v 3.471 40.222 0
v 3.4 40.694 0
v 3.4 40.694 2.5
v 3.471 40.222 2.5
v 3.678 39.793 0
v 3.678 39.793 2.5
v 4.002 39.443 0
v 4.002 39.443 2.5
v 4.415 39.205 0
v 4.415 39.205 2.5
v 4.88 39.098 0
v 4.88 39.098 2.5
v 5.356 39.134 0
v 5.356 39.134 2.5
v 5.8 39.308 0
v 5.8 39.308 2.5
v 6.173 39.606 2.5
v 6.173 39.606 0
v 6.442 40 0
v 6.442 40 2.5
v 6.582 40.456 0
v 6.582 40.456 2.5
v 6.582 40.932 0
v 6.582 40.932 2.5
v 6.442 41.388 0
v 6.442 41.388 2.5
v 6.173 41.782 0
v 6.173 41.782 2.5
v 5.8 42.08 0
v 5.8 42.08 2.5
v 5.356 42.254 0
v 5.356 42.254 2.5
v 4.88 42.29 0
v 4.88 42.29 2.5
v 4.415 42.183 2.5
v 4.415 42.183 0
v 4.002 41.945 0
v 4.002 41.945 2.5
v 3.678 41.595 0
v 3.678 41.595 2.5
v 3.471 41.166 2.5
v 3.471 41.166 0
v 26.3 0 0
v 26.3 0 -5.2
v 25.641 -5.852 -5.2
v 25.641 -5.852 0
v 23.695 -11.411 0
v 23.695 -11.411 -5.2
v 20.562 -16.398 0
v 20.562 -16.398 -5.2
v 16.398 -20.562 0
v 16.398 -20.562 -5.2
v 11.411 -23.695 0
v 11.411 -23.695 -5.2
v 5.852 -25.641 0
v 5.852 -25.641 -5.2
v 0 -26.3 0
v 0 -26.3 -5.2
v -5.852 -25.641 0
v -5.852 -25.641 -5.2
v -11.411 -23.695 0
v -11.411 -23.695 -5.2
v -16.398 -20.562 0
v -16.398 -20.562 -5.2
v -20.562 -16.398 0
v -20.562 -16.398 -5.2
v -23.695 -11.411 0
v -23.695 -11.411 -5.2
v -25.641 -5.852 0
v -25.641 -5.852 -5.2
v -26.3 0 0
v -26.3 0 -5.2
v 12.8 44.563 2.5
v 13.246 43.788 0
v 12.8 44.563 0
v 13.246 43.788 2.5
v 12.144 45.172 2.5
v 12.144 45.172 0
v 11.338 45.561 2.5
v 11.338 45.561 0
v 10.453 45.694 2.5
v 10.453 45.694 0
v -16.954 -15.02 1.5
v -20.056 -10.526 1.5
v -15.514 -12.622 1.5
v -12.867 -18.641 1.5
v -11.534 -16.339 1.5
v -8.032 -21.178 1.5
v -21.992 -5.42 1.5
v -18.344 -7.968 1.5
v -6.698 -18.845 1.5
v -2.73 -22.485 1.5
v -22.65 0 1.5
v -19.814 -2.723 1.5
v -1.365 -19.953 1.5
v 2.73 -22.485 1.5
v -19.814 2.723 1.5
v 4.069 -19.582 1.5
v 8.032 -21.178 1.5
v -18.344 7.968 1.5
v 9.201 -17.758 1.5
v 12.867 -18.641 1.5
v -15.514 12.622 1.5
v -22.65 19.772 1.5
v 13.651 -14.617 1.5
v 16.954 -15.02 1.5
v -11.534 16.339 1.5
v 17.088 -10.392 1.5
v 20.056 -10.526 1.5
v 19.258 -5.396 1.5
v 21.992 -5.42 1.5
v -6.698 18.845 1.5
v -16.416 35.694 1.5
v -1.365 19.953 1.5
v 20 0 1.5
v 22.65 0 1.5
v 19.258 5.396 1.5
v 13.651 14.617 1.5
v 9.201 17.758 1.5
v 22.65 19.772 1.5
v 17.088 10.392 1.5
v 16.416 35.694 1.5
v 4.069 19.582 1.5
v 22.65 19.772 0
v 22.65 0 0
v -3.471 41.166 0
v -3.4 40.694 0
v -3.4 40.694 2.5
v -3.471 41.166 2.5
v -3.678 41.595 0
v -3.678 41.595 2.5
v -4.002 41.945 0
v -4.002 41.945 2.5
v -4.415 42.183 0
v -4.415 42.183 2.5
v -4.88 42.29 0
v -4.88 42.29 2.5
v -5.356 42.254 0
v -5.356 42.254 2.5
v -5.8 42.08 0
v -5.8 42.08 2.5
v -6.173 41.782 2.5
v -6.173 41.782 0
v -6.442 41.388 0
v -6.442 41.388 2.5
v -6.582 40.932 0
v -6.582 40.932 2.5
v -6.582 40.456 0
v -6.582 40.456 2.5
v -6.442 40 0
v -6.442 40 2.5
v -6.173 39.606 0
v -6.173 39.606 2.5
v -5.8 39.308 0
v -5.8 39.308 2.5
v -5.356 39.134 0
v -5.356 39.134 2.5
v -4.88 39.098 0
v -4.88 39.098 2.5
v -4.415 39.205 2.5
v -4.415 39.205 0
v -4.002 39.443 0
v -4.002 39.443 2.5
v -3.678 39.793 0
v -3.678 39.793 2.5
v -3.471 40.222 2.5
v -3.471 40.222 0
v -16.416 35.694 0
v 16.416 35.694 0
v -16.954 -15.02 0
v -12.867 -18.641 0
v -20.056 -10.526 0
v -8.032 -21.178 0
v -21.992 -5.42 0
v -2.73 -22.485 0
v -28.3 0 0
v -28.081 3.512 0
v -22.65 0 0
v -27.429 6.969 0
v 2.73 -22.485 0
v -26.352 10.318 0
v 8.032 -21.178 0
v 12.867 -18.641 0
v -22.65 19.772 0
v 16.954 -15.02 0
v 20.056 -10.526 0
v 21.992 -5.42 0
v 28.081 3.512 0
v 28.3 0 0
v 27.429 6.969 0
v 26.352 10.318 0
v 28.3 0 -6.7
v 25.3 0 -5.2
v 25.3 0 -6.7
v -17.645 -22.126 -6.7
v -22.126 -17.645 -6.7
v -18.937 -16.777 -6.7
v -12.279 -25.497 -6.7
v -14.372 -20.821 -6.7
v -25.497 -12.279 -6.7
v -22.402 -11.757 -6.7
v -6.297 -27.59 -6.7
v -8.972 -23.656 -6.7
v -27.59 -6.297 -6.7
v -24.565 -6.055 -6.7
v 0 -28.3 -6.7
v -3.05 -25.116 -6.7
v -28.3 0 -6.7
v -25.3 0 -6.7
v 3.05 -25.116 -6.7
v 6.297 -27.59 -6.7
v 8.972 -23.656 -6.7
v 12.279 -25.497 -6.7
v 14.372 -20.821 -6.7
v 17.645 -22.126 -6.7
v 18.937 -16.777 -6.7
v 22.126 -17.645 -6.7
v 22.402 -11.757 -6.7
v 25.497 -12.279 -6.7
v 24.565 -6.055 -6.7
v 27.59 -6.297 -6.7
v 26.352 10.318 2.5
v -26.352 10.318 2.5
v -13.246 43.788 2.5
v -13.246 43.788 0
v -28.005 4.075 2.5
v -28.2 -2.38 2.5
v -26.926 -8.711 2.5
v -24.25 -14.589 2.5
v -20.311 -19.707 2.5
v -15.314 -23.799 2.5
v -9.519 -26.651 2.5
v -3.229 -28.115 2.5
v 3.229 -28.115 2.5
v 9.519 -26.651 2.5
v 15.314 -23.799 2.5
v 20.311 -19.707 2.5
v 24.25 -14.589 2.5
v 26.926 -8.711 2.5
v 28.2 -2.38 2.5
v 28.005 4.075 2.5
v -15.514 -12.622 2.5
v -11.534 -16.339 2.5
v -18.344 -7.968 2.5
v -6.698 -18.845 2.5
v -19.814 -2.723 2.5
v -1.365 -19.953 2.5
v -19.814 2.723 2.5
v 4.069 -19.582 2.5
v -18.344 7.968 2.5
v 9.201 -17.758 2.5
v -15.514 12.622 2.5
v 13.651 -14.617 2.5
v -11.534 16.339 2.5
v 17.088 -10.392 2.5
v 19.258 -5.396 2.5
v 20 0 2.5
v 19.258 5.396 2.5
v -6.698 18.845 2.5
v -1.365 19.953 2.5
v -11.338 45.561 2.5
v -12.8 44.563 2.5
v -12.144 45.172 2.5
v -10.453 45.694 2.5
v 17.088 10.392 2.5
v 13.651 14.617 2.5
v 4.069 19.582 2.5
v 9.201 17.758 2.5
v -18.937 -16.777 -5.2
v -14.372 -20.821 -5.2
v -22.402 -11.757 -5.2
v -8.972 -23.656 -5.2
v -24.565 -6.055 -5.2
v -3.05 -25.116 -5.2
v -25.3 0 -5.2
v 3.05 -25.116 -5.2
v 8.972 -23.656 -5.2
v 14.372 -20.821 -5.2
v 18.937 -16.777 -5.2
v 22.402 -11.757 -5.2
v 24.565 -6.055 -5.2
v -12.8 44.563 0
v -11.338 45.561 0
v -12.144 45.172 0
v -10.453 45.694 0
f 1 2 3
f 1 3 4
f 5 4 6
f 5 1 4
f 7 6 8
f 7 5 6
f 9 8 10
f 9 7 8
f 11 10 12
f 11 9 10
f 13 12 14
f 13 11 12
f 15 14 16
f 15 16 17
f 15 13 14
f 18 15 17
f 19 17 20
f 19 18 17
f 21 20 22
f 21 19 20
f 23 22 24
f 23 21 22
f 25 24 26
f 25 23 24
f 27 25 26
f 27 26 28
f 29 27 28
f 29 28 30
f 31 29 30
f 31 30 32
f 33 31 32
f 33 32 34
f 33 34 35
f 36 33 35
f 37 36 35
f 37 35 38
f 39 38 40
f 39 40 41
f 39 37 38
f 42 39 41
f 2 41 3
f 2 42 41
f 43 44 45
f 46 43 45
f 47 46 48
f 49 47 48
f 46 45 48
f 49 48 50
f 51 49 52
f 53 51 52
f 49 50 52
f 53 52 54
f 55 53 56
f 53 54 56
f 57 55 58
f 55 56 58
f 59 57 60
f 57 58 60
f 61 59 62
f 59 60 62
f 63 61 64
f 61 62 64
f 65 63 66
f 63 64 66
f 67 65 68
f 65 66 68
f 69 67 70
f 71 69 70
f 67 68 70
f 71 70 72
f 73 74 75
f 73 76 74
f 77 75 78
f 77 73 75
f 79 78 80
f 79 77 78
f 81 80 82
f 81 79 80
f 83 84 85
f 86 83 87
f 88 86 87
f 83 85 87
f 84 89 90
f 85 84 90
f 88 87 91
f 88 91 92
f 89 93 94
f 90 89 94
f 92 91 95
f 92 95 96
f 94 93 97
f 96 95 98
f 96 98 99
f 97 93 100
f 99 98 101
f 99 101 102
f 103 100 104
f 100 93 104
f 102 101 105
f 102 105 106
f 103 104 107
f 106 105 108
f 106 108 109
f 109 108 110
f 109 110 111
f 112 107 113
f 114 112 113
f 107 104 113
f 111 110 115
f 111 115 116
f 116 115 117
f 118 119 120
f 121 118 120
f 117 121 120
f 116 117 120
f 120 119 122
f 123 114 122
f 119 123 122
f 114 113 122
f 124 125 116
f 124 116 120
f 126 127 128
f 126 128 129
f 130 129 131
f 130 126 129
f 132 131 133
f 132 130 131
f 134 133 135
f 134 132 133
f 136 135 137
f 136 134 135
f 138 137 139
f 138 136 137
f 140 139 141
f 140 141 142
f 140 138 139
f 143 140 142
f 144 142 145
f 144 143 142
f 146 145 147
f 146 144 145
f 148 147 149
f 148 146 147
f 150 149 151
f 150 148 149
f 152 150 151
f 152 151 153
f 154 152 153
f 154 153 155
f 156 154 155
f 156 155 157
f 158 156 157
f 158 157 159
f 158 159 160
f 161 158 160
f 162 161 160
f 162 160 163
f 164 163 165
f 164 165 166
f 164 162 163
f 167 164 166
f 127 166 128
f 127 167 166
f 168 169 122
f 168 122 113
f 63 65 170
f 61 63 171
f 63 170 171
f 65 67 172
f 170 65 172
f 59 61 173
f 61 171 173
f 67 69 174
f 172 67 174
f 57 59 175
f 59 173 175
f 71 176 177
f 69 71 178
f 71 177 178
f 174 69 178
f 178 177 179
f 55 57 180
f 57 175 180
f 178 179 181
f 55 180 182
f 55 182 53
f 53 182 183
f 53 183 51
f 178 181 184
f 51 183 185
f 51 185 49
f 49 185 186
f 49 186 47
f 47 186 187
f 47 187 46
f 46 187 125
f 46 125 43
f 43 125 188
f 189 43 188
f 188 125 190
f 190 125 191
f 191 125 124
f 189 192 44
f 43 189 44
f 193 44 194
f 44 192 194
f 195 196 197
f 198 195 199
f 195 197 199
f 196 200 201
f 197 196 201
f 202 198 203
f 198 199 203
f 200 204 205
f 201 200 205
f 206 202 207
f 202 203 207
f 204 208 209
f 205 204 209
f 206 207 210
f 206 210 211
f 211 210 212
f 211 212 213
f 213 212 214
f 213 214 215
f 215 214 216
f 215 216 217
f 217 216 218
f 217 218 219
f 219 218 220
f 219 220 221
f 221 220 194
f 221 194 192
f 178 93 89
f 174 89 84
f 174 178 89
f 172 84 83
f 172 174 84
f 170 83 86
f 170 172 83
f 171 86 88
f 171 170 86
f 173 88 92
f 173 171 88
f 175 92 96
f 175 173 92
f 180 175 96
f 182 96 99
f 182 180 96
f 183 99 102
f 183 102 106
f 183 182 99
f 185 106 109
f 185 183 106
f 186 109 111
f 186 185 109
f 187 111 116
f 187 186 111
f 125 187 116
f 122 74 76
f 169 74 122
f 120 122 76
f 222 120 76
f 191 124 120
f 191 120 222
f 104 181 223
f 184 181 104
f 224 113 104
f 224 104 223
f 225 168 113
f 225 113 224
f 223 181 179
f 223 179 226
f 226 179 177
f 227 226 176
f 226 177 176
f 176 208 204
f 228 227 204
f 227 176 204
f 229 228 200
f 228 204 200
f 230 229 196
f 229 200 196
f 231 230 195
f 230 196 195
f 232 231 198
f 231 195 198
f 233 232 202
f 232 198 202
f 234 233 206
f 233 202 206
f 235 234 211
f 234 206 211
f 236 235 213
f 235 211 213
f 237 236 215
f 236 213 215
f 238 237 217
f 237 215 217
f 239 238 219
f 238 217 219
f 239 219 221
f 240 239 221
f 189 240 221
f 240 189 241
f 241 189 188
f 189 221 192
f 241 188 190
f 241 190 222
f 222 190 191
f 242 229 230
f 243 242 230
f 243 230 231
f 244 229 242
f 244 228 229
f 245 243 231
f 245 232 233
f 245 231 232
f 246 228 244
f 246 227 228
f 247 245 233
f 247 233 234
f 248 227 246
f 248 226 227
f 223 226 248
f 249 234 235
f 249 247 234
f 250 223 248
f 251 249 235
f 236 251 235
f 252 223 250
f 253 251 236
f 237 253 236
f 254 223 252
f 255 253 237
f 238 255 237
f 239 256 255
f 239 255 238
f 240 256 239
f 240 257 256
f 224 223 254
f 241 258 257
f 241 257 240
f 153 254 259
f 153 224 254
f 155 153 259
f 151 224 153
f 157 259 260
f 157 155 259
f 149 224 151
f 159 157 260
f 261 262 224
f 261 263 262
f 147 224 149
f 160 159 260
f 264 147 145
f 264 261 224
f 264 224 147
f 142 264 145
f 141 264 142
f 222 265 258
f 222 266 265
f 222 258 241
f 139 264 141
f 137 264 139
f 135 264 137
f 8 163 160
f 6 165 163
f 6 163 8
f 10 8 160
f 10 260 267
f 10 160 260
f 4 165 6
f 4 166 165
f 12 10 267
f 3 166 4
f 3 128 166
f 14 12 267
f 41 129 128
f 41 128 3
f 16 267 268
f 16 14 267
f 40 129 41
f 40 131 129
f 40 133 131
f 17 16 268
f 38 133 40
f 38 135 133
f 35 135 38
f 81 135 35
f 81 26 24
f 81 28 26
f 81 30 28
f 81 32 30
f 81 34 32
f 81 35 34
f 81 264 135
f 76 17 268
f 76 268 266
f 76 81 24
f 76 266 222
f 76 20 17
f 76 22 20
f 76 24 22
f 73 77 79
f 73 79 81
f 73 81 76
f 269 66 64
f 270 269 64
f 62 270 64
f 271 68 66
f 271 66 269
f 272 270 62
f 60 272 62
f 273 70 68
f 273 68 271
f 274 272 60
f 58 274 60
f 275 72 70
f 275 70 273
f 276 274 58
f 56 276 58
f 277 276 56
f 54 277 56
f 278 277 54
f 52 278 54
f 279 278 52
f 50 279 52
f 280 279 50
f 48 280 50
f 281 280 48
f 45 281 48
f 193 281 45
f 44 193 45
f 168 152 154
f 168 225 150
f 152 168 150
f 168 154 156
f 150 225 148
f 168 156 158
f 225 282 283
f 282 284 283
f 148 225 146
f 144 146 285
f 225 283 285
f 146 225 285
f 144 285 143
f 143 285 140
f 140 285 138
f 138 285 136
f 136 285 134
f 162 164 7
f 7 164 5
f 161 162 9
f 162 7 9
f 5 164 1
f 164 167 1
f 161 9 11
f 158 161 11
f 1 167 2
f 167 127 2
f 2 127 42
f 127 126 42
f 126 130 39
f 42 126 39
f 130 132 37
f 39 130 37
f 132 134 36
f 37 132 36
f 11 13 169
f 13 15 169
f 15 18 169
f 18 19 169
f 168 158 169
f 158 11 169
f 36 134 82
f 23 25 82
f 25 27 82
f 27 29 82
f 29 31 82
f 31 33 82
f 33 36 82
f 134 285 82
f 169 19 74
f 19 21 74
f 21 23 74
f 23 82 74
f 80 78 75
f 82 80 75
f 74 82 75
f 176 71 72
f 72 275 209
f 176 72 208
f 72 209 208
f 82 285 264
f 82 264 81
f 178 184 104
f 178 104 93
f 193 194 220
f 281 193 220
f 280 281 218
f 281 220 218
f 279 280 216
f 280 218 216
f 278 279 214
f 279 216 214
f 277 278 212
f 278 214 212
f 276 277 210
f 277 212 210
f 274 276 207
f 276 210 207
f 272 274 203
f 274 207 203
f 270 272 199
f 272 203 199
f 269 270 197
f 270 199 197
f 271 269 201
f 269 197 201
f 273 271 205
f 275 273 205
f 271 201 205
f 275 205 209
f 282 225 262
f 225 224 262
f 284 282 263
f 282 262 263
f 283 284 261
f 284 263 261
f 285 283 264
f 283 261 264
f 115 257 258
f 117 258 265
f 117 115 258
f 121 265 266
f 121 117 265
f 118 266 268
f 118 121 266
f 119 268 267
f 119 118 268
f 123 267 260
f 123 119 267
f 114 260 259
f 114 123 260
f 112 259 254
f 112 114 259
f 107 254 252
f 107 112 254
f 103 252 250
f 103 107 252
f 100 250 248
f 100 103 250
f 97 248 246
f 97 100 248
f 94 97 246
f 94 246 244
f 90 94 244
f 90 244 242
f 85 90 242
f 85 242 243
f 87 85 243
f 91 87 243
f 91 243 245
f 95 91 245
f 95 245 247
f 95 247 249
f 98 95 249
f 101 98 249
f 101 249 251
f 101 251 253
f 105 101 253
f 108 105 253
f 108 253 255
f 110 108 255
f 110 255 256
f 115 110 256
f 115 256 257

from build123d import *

# Parameters (mm, degrees)
SKETCH_1_R          = 28.3
SKETCH_1_R_2        = 20
EXTRUDE_1_DEPTH     = 2.5
EXTRUDE_START       = -2.5
SKETCH_2_R          = 1.6
EXTRUDE_2_DEPTH     = 2.5
EXTRUDE_START_2     = 5.2
EXTRUDE_3_DEPTH     = 5.2
EXTRUDE_START_3     = 1.5
EXTRUDE_4_DEPTH     = 1.5
CUT_EXTRUDE_START   = 10
CUT_EXTRUDE_1_DEPTH = 11.5
FILLET_1_R          = 3


with BuildPart() as part:
    # 草图1 → 凸台-拉伸1 (new body)
    with BuildSketch(Plane.XY):
        Circle(SKETCH_1_R)
        Circle(SKETCH_1_R_2, mode=Mode.SUBTRACT)
    extrude(amount=EXTRUDE_1_DEPTH)

    # 草图2 → 凸台-拉伸2 (add)
    with BuildSketch(Plane.XY.offset(2.5).offset(EXTRUDE_START)):
        with BuildLine():
            Line((-26.351833365, 10.318472674), (-12.5, 45.693979899))
            Line((-12.5, 45.693979899), (12.5, 45.693979899))
            Line((12.5, 45.693979899), (26.351833365, 10.318472674))
            ThreePointArc((26.351833365, 10.318472674), (0, 28.3), (-26.351833365, 10.318472674))
        make_face()
        with Locations((-5, 40.693979899)):
            Circle(SKETCH_2_R, mode=Mode.SUBTRACT)
        with Locations(Location((5, 40.693979899, 0), (0, 0, 180))):
            Circle(SKETCH_2_R, mode=Mode.SUBTRACT)
    extrude(amount=EXTRUDE_2_DEPTH)

    # 草图5 → 凸台-拉伸3 (add)
    with BuildSketch(Plane(origin=(0, 0, 0), x_dir=(-1, 0, 0), z_dir=(0, 0, -1)).offset(EXTRUDE_START_2)):
        with BuildLine():
            Line((-28.3, 0), (-26.3, 0))
            ThreePointArc((-26.3, 0), (0, -26.3), (26.3, 0))
            Line((26.3, 0), (28.3, 0))
            ThreePointArc((28.3, 0), (0, -28.3), (-28.3, 0))
        make_face()
    extrude(amount=-EXTRUDE_3_DEPTH)

    # 草图6 → 凸台-拉伸4 (add)
    with BuildSketch(Plane(origin=(0, 0, -5.2), x_dir=(-1, 0, 0), z_dir=(0, 0, -1)).offset(EXTRUDE_START_3)):
        with BuildLine():
            Line((-28.3, 0), (-25.3, 0))
            ThreePointArc((-25.3, 0), (0, -25.3), (25.3, 0))
            Line((25.3, 0), (28.3, 0))
            ThreePointArc((28.3, 0), (0, -28.3), (-28.3, 0))
        make_face()
    extrude(amount=-EXTRUDE_4_DEPTH)

    # 草图4 → 切除-拉伸1 (cut)
    with BuildSketch(Plane(origin=(0, 0, 0), x_dir=(-1, 0, 0), z_dir=(0, 0, -1)).offset(CUT_EXTRUDE_START)):
        with BuildLine():
            Line((-22.65, 0), (-22.65, 35.693979899))
            Line((-22.65, 35.693979899), (22.65, 35.693979899))
            Line((22.65, 35.693979899), (22.65, 0))
            ThreePointArc((22.65, 0), (0, -22.65), (-22.65, 0))
        make_face()
    extrude(amount=-CUT_EXTRUDE_1_DEPTH, mode=Mode.SUBTRACT)

    # 圆角1
    fillet_1_edges = [part.edges().sort_by_distance(p)[0] for p in [
        (-12.5, 45.693979899, 1.25),
        (12.5, 45.693979899, 1.25),
    ]]
    fillet(fillet_1_edges, radius=FILLET_1_R)


solid = part.part
